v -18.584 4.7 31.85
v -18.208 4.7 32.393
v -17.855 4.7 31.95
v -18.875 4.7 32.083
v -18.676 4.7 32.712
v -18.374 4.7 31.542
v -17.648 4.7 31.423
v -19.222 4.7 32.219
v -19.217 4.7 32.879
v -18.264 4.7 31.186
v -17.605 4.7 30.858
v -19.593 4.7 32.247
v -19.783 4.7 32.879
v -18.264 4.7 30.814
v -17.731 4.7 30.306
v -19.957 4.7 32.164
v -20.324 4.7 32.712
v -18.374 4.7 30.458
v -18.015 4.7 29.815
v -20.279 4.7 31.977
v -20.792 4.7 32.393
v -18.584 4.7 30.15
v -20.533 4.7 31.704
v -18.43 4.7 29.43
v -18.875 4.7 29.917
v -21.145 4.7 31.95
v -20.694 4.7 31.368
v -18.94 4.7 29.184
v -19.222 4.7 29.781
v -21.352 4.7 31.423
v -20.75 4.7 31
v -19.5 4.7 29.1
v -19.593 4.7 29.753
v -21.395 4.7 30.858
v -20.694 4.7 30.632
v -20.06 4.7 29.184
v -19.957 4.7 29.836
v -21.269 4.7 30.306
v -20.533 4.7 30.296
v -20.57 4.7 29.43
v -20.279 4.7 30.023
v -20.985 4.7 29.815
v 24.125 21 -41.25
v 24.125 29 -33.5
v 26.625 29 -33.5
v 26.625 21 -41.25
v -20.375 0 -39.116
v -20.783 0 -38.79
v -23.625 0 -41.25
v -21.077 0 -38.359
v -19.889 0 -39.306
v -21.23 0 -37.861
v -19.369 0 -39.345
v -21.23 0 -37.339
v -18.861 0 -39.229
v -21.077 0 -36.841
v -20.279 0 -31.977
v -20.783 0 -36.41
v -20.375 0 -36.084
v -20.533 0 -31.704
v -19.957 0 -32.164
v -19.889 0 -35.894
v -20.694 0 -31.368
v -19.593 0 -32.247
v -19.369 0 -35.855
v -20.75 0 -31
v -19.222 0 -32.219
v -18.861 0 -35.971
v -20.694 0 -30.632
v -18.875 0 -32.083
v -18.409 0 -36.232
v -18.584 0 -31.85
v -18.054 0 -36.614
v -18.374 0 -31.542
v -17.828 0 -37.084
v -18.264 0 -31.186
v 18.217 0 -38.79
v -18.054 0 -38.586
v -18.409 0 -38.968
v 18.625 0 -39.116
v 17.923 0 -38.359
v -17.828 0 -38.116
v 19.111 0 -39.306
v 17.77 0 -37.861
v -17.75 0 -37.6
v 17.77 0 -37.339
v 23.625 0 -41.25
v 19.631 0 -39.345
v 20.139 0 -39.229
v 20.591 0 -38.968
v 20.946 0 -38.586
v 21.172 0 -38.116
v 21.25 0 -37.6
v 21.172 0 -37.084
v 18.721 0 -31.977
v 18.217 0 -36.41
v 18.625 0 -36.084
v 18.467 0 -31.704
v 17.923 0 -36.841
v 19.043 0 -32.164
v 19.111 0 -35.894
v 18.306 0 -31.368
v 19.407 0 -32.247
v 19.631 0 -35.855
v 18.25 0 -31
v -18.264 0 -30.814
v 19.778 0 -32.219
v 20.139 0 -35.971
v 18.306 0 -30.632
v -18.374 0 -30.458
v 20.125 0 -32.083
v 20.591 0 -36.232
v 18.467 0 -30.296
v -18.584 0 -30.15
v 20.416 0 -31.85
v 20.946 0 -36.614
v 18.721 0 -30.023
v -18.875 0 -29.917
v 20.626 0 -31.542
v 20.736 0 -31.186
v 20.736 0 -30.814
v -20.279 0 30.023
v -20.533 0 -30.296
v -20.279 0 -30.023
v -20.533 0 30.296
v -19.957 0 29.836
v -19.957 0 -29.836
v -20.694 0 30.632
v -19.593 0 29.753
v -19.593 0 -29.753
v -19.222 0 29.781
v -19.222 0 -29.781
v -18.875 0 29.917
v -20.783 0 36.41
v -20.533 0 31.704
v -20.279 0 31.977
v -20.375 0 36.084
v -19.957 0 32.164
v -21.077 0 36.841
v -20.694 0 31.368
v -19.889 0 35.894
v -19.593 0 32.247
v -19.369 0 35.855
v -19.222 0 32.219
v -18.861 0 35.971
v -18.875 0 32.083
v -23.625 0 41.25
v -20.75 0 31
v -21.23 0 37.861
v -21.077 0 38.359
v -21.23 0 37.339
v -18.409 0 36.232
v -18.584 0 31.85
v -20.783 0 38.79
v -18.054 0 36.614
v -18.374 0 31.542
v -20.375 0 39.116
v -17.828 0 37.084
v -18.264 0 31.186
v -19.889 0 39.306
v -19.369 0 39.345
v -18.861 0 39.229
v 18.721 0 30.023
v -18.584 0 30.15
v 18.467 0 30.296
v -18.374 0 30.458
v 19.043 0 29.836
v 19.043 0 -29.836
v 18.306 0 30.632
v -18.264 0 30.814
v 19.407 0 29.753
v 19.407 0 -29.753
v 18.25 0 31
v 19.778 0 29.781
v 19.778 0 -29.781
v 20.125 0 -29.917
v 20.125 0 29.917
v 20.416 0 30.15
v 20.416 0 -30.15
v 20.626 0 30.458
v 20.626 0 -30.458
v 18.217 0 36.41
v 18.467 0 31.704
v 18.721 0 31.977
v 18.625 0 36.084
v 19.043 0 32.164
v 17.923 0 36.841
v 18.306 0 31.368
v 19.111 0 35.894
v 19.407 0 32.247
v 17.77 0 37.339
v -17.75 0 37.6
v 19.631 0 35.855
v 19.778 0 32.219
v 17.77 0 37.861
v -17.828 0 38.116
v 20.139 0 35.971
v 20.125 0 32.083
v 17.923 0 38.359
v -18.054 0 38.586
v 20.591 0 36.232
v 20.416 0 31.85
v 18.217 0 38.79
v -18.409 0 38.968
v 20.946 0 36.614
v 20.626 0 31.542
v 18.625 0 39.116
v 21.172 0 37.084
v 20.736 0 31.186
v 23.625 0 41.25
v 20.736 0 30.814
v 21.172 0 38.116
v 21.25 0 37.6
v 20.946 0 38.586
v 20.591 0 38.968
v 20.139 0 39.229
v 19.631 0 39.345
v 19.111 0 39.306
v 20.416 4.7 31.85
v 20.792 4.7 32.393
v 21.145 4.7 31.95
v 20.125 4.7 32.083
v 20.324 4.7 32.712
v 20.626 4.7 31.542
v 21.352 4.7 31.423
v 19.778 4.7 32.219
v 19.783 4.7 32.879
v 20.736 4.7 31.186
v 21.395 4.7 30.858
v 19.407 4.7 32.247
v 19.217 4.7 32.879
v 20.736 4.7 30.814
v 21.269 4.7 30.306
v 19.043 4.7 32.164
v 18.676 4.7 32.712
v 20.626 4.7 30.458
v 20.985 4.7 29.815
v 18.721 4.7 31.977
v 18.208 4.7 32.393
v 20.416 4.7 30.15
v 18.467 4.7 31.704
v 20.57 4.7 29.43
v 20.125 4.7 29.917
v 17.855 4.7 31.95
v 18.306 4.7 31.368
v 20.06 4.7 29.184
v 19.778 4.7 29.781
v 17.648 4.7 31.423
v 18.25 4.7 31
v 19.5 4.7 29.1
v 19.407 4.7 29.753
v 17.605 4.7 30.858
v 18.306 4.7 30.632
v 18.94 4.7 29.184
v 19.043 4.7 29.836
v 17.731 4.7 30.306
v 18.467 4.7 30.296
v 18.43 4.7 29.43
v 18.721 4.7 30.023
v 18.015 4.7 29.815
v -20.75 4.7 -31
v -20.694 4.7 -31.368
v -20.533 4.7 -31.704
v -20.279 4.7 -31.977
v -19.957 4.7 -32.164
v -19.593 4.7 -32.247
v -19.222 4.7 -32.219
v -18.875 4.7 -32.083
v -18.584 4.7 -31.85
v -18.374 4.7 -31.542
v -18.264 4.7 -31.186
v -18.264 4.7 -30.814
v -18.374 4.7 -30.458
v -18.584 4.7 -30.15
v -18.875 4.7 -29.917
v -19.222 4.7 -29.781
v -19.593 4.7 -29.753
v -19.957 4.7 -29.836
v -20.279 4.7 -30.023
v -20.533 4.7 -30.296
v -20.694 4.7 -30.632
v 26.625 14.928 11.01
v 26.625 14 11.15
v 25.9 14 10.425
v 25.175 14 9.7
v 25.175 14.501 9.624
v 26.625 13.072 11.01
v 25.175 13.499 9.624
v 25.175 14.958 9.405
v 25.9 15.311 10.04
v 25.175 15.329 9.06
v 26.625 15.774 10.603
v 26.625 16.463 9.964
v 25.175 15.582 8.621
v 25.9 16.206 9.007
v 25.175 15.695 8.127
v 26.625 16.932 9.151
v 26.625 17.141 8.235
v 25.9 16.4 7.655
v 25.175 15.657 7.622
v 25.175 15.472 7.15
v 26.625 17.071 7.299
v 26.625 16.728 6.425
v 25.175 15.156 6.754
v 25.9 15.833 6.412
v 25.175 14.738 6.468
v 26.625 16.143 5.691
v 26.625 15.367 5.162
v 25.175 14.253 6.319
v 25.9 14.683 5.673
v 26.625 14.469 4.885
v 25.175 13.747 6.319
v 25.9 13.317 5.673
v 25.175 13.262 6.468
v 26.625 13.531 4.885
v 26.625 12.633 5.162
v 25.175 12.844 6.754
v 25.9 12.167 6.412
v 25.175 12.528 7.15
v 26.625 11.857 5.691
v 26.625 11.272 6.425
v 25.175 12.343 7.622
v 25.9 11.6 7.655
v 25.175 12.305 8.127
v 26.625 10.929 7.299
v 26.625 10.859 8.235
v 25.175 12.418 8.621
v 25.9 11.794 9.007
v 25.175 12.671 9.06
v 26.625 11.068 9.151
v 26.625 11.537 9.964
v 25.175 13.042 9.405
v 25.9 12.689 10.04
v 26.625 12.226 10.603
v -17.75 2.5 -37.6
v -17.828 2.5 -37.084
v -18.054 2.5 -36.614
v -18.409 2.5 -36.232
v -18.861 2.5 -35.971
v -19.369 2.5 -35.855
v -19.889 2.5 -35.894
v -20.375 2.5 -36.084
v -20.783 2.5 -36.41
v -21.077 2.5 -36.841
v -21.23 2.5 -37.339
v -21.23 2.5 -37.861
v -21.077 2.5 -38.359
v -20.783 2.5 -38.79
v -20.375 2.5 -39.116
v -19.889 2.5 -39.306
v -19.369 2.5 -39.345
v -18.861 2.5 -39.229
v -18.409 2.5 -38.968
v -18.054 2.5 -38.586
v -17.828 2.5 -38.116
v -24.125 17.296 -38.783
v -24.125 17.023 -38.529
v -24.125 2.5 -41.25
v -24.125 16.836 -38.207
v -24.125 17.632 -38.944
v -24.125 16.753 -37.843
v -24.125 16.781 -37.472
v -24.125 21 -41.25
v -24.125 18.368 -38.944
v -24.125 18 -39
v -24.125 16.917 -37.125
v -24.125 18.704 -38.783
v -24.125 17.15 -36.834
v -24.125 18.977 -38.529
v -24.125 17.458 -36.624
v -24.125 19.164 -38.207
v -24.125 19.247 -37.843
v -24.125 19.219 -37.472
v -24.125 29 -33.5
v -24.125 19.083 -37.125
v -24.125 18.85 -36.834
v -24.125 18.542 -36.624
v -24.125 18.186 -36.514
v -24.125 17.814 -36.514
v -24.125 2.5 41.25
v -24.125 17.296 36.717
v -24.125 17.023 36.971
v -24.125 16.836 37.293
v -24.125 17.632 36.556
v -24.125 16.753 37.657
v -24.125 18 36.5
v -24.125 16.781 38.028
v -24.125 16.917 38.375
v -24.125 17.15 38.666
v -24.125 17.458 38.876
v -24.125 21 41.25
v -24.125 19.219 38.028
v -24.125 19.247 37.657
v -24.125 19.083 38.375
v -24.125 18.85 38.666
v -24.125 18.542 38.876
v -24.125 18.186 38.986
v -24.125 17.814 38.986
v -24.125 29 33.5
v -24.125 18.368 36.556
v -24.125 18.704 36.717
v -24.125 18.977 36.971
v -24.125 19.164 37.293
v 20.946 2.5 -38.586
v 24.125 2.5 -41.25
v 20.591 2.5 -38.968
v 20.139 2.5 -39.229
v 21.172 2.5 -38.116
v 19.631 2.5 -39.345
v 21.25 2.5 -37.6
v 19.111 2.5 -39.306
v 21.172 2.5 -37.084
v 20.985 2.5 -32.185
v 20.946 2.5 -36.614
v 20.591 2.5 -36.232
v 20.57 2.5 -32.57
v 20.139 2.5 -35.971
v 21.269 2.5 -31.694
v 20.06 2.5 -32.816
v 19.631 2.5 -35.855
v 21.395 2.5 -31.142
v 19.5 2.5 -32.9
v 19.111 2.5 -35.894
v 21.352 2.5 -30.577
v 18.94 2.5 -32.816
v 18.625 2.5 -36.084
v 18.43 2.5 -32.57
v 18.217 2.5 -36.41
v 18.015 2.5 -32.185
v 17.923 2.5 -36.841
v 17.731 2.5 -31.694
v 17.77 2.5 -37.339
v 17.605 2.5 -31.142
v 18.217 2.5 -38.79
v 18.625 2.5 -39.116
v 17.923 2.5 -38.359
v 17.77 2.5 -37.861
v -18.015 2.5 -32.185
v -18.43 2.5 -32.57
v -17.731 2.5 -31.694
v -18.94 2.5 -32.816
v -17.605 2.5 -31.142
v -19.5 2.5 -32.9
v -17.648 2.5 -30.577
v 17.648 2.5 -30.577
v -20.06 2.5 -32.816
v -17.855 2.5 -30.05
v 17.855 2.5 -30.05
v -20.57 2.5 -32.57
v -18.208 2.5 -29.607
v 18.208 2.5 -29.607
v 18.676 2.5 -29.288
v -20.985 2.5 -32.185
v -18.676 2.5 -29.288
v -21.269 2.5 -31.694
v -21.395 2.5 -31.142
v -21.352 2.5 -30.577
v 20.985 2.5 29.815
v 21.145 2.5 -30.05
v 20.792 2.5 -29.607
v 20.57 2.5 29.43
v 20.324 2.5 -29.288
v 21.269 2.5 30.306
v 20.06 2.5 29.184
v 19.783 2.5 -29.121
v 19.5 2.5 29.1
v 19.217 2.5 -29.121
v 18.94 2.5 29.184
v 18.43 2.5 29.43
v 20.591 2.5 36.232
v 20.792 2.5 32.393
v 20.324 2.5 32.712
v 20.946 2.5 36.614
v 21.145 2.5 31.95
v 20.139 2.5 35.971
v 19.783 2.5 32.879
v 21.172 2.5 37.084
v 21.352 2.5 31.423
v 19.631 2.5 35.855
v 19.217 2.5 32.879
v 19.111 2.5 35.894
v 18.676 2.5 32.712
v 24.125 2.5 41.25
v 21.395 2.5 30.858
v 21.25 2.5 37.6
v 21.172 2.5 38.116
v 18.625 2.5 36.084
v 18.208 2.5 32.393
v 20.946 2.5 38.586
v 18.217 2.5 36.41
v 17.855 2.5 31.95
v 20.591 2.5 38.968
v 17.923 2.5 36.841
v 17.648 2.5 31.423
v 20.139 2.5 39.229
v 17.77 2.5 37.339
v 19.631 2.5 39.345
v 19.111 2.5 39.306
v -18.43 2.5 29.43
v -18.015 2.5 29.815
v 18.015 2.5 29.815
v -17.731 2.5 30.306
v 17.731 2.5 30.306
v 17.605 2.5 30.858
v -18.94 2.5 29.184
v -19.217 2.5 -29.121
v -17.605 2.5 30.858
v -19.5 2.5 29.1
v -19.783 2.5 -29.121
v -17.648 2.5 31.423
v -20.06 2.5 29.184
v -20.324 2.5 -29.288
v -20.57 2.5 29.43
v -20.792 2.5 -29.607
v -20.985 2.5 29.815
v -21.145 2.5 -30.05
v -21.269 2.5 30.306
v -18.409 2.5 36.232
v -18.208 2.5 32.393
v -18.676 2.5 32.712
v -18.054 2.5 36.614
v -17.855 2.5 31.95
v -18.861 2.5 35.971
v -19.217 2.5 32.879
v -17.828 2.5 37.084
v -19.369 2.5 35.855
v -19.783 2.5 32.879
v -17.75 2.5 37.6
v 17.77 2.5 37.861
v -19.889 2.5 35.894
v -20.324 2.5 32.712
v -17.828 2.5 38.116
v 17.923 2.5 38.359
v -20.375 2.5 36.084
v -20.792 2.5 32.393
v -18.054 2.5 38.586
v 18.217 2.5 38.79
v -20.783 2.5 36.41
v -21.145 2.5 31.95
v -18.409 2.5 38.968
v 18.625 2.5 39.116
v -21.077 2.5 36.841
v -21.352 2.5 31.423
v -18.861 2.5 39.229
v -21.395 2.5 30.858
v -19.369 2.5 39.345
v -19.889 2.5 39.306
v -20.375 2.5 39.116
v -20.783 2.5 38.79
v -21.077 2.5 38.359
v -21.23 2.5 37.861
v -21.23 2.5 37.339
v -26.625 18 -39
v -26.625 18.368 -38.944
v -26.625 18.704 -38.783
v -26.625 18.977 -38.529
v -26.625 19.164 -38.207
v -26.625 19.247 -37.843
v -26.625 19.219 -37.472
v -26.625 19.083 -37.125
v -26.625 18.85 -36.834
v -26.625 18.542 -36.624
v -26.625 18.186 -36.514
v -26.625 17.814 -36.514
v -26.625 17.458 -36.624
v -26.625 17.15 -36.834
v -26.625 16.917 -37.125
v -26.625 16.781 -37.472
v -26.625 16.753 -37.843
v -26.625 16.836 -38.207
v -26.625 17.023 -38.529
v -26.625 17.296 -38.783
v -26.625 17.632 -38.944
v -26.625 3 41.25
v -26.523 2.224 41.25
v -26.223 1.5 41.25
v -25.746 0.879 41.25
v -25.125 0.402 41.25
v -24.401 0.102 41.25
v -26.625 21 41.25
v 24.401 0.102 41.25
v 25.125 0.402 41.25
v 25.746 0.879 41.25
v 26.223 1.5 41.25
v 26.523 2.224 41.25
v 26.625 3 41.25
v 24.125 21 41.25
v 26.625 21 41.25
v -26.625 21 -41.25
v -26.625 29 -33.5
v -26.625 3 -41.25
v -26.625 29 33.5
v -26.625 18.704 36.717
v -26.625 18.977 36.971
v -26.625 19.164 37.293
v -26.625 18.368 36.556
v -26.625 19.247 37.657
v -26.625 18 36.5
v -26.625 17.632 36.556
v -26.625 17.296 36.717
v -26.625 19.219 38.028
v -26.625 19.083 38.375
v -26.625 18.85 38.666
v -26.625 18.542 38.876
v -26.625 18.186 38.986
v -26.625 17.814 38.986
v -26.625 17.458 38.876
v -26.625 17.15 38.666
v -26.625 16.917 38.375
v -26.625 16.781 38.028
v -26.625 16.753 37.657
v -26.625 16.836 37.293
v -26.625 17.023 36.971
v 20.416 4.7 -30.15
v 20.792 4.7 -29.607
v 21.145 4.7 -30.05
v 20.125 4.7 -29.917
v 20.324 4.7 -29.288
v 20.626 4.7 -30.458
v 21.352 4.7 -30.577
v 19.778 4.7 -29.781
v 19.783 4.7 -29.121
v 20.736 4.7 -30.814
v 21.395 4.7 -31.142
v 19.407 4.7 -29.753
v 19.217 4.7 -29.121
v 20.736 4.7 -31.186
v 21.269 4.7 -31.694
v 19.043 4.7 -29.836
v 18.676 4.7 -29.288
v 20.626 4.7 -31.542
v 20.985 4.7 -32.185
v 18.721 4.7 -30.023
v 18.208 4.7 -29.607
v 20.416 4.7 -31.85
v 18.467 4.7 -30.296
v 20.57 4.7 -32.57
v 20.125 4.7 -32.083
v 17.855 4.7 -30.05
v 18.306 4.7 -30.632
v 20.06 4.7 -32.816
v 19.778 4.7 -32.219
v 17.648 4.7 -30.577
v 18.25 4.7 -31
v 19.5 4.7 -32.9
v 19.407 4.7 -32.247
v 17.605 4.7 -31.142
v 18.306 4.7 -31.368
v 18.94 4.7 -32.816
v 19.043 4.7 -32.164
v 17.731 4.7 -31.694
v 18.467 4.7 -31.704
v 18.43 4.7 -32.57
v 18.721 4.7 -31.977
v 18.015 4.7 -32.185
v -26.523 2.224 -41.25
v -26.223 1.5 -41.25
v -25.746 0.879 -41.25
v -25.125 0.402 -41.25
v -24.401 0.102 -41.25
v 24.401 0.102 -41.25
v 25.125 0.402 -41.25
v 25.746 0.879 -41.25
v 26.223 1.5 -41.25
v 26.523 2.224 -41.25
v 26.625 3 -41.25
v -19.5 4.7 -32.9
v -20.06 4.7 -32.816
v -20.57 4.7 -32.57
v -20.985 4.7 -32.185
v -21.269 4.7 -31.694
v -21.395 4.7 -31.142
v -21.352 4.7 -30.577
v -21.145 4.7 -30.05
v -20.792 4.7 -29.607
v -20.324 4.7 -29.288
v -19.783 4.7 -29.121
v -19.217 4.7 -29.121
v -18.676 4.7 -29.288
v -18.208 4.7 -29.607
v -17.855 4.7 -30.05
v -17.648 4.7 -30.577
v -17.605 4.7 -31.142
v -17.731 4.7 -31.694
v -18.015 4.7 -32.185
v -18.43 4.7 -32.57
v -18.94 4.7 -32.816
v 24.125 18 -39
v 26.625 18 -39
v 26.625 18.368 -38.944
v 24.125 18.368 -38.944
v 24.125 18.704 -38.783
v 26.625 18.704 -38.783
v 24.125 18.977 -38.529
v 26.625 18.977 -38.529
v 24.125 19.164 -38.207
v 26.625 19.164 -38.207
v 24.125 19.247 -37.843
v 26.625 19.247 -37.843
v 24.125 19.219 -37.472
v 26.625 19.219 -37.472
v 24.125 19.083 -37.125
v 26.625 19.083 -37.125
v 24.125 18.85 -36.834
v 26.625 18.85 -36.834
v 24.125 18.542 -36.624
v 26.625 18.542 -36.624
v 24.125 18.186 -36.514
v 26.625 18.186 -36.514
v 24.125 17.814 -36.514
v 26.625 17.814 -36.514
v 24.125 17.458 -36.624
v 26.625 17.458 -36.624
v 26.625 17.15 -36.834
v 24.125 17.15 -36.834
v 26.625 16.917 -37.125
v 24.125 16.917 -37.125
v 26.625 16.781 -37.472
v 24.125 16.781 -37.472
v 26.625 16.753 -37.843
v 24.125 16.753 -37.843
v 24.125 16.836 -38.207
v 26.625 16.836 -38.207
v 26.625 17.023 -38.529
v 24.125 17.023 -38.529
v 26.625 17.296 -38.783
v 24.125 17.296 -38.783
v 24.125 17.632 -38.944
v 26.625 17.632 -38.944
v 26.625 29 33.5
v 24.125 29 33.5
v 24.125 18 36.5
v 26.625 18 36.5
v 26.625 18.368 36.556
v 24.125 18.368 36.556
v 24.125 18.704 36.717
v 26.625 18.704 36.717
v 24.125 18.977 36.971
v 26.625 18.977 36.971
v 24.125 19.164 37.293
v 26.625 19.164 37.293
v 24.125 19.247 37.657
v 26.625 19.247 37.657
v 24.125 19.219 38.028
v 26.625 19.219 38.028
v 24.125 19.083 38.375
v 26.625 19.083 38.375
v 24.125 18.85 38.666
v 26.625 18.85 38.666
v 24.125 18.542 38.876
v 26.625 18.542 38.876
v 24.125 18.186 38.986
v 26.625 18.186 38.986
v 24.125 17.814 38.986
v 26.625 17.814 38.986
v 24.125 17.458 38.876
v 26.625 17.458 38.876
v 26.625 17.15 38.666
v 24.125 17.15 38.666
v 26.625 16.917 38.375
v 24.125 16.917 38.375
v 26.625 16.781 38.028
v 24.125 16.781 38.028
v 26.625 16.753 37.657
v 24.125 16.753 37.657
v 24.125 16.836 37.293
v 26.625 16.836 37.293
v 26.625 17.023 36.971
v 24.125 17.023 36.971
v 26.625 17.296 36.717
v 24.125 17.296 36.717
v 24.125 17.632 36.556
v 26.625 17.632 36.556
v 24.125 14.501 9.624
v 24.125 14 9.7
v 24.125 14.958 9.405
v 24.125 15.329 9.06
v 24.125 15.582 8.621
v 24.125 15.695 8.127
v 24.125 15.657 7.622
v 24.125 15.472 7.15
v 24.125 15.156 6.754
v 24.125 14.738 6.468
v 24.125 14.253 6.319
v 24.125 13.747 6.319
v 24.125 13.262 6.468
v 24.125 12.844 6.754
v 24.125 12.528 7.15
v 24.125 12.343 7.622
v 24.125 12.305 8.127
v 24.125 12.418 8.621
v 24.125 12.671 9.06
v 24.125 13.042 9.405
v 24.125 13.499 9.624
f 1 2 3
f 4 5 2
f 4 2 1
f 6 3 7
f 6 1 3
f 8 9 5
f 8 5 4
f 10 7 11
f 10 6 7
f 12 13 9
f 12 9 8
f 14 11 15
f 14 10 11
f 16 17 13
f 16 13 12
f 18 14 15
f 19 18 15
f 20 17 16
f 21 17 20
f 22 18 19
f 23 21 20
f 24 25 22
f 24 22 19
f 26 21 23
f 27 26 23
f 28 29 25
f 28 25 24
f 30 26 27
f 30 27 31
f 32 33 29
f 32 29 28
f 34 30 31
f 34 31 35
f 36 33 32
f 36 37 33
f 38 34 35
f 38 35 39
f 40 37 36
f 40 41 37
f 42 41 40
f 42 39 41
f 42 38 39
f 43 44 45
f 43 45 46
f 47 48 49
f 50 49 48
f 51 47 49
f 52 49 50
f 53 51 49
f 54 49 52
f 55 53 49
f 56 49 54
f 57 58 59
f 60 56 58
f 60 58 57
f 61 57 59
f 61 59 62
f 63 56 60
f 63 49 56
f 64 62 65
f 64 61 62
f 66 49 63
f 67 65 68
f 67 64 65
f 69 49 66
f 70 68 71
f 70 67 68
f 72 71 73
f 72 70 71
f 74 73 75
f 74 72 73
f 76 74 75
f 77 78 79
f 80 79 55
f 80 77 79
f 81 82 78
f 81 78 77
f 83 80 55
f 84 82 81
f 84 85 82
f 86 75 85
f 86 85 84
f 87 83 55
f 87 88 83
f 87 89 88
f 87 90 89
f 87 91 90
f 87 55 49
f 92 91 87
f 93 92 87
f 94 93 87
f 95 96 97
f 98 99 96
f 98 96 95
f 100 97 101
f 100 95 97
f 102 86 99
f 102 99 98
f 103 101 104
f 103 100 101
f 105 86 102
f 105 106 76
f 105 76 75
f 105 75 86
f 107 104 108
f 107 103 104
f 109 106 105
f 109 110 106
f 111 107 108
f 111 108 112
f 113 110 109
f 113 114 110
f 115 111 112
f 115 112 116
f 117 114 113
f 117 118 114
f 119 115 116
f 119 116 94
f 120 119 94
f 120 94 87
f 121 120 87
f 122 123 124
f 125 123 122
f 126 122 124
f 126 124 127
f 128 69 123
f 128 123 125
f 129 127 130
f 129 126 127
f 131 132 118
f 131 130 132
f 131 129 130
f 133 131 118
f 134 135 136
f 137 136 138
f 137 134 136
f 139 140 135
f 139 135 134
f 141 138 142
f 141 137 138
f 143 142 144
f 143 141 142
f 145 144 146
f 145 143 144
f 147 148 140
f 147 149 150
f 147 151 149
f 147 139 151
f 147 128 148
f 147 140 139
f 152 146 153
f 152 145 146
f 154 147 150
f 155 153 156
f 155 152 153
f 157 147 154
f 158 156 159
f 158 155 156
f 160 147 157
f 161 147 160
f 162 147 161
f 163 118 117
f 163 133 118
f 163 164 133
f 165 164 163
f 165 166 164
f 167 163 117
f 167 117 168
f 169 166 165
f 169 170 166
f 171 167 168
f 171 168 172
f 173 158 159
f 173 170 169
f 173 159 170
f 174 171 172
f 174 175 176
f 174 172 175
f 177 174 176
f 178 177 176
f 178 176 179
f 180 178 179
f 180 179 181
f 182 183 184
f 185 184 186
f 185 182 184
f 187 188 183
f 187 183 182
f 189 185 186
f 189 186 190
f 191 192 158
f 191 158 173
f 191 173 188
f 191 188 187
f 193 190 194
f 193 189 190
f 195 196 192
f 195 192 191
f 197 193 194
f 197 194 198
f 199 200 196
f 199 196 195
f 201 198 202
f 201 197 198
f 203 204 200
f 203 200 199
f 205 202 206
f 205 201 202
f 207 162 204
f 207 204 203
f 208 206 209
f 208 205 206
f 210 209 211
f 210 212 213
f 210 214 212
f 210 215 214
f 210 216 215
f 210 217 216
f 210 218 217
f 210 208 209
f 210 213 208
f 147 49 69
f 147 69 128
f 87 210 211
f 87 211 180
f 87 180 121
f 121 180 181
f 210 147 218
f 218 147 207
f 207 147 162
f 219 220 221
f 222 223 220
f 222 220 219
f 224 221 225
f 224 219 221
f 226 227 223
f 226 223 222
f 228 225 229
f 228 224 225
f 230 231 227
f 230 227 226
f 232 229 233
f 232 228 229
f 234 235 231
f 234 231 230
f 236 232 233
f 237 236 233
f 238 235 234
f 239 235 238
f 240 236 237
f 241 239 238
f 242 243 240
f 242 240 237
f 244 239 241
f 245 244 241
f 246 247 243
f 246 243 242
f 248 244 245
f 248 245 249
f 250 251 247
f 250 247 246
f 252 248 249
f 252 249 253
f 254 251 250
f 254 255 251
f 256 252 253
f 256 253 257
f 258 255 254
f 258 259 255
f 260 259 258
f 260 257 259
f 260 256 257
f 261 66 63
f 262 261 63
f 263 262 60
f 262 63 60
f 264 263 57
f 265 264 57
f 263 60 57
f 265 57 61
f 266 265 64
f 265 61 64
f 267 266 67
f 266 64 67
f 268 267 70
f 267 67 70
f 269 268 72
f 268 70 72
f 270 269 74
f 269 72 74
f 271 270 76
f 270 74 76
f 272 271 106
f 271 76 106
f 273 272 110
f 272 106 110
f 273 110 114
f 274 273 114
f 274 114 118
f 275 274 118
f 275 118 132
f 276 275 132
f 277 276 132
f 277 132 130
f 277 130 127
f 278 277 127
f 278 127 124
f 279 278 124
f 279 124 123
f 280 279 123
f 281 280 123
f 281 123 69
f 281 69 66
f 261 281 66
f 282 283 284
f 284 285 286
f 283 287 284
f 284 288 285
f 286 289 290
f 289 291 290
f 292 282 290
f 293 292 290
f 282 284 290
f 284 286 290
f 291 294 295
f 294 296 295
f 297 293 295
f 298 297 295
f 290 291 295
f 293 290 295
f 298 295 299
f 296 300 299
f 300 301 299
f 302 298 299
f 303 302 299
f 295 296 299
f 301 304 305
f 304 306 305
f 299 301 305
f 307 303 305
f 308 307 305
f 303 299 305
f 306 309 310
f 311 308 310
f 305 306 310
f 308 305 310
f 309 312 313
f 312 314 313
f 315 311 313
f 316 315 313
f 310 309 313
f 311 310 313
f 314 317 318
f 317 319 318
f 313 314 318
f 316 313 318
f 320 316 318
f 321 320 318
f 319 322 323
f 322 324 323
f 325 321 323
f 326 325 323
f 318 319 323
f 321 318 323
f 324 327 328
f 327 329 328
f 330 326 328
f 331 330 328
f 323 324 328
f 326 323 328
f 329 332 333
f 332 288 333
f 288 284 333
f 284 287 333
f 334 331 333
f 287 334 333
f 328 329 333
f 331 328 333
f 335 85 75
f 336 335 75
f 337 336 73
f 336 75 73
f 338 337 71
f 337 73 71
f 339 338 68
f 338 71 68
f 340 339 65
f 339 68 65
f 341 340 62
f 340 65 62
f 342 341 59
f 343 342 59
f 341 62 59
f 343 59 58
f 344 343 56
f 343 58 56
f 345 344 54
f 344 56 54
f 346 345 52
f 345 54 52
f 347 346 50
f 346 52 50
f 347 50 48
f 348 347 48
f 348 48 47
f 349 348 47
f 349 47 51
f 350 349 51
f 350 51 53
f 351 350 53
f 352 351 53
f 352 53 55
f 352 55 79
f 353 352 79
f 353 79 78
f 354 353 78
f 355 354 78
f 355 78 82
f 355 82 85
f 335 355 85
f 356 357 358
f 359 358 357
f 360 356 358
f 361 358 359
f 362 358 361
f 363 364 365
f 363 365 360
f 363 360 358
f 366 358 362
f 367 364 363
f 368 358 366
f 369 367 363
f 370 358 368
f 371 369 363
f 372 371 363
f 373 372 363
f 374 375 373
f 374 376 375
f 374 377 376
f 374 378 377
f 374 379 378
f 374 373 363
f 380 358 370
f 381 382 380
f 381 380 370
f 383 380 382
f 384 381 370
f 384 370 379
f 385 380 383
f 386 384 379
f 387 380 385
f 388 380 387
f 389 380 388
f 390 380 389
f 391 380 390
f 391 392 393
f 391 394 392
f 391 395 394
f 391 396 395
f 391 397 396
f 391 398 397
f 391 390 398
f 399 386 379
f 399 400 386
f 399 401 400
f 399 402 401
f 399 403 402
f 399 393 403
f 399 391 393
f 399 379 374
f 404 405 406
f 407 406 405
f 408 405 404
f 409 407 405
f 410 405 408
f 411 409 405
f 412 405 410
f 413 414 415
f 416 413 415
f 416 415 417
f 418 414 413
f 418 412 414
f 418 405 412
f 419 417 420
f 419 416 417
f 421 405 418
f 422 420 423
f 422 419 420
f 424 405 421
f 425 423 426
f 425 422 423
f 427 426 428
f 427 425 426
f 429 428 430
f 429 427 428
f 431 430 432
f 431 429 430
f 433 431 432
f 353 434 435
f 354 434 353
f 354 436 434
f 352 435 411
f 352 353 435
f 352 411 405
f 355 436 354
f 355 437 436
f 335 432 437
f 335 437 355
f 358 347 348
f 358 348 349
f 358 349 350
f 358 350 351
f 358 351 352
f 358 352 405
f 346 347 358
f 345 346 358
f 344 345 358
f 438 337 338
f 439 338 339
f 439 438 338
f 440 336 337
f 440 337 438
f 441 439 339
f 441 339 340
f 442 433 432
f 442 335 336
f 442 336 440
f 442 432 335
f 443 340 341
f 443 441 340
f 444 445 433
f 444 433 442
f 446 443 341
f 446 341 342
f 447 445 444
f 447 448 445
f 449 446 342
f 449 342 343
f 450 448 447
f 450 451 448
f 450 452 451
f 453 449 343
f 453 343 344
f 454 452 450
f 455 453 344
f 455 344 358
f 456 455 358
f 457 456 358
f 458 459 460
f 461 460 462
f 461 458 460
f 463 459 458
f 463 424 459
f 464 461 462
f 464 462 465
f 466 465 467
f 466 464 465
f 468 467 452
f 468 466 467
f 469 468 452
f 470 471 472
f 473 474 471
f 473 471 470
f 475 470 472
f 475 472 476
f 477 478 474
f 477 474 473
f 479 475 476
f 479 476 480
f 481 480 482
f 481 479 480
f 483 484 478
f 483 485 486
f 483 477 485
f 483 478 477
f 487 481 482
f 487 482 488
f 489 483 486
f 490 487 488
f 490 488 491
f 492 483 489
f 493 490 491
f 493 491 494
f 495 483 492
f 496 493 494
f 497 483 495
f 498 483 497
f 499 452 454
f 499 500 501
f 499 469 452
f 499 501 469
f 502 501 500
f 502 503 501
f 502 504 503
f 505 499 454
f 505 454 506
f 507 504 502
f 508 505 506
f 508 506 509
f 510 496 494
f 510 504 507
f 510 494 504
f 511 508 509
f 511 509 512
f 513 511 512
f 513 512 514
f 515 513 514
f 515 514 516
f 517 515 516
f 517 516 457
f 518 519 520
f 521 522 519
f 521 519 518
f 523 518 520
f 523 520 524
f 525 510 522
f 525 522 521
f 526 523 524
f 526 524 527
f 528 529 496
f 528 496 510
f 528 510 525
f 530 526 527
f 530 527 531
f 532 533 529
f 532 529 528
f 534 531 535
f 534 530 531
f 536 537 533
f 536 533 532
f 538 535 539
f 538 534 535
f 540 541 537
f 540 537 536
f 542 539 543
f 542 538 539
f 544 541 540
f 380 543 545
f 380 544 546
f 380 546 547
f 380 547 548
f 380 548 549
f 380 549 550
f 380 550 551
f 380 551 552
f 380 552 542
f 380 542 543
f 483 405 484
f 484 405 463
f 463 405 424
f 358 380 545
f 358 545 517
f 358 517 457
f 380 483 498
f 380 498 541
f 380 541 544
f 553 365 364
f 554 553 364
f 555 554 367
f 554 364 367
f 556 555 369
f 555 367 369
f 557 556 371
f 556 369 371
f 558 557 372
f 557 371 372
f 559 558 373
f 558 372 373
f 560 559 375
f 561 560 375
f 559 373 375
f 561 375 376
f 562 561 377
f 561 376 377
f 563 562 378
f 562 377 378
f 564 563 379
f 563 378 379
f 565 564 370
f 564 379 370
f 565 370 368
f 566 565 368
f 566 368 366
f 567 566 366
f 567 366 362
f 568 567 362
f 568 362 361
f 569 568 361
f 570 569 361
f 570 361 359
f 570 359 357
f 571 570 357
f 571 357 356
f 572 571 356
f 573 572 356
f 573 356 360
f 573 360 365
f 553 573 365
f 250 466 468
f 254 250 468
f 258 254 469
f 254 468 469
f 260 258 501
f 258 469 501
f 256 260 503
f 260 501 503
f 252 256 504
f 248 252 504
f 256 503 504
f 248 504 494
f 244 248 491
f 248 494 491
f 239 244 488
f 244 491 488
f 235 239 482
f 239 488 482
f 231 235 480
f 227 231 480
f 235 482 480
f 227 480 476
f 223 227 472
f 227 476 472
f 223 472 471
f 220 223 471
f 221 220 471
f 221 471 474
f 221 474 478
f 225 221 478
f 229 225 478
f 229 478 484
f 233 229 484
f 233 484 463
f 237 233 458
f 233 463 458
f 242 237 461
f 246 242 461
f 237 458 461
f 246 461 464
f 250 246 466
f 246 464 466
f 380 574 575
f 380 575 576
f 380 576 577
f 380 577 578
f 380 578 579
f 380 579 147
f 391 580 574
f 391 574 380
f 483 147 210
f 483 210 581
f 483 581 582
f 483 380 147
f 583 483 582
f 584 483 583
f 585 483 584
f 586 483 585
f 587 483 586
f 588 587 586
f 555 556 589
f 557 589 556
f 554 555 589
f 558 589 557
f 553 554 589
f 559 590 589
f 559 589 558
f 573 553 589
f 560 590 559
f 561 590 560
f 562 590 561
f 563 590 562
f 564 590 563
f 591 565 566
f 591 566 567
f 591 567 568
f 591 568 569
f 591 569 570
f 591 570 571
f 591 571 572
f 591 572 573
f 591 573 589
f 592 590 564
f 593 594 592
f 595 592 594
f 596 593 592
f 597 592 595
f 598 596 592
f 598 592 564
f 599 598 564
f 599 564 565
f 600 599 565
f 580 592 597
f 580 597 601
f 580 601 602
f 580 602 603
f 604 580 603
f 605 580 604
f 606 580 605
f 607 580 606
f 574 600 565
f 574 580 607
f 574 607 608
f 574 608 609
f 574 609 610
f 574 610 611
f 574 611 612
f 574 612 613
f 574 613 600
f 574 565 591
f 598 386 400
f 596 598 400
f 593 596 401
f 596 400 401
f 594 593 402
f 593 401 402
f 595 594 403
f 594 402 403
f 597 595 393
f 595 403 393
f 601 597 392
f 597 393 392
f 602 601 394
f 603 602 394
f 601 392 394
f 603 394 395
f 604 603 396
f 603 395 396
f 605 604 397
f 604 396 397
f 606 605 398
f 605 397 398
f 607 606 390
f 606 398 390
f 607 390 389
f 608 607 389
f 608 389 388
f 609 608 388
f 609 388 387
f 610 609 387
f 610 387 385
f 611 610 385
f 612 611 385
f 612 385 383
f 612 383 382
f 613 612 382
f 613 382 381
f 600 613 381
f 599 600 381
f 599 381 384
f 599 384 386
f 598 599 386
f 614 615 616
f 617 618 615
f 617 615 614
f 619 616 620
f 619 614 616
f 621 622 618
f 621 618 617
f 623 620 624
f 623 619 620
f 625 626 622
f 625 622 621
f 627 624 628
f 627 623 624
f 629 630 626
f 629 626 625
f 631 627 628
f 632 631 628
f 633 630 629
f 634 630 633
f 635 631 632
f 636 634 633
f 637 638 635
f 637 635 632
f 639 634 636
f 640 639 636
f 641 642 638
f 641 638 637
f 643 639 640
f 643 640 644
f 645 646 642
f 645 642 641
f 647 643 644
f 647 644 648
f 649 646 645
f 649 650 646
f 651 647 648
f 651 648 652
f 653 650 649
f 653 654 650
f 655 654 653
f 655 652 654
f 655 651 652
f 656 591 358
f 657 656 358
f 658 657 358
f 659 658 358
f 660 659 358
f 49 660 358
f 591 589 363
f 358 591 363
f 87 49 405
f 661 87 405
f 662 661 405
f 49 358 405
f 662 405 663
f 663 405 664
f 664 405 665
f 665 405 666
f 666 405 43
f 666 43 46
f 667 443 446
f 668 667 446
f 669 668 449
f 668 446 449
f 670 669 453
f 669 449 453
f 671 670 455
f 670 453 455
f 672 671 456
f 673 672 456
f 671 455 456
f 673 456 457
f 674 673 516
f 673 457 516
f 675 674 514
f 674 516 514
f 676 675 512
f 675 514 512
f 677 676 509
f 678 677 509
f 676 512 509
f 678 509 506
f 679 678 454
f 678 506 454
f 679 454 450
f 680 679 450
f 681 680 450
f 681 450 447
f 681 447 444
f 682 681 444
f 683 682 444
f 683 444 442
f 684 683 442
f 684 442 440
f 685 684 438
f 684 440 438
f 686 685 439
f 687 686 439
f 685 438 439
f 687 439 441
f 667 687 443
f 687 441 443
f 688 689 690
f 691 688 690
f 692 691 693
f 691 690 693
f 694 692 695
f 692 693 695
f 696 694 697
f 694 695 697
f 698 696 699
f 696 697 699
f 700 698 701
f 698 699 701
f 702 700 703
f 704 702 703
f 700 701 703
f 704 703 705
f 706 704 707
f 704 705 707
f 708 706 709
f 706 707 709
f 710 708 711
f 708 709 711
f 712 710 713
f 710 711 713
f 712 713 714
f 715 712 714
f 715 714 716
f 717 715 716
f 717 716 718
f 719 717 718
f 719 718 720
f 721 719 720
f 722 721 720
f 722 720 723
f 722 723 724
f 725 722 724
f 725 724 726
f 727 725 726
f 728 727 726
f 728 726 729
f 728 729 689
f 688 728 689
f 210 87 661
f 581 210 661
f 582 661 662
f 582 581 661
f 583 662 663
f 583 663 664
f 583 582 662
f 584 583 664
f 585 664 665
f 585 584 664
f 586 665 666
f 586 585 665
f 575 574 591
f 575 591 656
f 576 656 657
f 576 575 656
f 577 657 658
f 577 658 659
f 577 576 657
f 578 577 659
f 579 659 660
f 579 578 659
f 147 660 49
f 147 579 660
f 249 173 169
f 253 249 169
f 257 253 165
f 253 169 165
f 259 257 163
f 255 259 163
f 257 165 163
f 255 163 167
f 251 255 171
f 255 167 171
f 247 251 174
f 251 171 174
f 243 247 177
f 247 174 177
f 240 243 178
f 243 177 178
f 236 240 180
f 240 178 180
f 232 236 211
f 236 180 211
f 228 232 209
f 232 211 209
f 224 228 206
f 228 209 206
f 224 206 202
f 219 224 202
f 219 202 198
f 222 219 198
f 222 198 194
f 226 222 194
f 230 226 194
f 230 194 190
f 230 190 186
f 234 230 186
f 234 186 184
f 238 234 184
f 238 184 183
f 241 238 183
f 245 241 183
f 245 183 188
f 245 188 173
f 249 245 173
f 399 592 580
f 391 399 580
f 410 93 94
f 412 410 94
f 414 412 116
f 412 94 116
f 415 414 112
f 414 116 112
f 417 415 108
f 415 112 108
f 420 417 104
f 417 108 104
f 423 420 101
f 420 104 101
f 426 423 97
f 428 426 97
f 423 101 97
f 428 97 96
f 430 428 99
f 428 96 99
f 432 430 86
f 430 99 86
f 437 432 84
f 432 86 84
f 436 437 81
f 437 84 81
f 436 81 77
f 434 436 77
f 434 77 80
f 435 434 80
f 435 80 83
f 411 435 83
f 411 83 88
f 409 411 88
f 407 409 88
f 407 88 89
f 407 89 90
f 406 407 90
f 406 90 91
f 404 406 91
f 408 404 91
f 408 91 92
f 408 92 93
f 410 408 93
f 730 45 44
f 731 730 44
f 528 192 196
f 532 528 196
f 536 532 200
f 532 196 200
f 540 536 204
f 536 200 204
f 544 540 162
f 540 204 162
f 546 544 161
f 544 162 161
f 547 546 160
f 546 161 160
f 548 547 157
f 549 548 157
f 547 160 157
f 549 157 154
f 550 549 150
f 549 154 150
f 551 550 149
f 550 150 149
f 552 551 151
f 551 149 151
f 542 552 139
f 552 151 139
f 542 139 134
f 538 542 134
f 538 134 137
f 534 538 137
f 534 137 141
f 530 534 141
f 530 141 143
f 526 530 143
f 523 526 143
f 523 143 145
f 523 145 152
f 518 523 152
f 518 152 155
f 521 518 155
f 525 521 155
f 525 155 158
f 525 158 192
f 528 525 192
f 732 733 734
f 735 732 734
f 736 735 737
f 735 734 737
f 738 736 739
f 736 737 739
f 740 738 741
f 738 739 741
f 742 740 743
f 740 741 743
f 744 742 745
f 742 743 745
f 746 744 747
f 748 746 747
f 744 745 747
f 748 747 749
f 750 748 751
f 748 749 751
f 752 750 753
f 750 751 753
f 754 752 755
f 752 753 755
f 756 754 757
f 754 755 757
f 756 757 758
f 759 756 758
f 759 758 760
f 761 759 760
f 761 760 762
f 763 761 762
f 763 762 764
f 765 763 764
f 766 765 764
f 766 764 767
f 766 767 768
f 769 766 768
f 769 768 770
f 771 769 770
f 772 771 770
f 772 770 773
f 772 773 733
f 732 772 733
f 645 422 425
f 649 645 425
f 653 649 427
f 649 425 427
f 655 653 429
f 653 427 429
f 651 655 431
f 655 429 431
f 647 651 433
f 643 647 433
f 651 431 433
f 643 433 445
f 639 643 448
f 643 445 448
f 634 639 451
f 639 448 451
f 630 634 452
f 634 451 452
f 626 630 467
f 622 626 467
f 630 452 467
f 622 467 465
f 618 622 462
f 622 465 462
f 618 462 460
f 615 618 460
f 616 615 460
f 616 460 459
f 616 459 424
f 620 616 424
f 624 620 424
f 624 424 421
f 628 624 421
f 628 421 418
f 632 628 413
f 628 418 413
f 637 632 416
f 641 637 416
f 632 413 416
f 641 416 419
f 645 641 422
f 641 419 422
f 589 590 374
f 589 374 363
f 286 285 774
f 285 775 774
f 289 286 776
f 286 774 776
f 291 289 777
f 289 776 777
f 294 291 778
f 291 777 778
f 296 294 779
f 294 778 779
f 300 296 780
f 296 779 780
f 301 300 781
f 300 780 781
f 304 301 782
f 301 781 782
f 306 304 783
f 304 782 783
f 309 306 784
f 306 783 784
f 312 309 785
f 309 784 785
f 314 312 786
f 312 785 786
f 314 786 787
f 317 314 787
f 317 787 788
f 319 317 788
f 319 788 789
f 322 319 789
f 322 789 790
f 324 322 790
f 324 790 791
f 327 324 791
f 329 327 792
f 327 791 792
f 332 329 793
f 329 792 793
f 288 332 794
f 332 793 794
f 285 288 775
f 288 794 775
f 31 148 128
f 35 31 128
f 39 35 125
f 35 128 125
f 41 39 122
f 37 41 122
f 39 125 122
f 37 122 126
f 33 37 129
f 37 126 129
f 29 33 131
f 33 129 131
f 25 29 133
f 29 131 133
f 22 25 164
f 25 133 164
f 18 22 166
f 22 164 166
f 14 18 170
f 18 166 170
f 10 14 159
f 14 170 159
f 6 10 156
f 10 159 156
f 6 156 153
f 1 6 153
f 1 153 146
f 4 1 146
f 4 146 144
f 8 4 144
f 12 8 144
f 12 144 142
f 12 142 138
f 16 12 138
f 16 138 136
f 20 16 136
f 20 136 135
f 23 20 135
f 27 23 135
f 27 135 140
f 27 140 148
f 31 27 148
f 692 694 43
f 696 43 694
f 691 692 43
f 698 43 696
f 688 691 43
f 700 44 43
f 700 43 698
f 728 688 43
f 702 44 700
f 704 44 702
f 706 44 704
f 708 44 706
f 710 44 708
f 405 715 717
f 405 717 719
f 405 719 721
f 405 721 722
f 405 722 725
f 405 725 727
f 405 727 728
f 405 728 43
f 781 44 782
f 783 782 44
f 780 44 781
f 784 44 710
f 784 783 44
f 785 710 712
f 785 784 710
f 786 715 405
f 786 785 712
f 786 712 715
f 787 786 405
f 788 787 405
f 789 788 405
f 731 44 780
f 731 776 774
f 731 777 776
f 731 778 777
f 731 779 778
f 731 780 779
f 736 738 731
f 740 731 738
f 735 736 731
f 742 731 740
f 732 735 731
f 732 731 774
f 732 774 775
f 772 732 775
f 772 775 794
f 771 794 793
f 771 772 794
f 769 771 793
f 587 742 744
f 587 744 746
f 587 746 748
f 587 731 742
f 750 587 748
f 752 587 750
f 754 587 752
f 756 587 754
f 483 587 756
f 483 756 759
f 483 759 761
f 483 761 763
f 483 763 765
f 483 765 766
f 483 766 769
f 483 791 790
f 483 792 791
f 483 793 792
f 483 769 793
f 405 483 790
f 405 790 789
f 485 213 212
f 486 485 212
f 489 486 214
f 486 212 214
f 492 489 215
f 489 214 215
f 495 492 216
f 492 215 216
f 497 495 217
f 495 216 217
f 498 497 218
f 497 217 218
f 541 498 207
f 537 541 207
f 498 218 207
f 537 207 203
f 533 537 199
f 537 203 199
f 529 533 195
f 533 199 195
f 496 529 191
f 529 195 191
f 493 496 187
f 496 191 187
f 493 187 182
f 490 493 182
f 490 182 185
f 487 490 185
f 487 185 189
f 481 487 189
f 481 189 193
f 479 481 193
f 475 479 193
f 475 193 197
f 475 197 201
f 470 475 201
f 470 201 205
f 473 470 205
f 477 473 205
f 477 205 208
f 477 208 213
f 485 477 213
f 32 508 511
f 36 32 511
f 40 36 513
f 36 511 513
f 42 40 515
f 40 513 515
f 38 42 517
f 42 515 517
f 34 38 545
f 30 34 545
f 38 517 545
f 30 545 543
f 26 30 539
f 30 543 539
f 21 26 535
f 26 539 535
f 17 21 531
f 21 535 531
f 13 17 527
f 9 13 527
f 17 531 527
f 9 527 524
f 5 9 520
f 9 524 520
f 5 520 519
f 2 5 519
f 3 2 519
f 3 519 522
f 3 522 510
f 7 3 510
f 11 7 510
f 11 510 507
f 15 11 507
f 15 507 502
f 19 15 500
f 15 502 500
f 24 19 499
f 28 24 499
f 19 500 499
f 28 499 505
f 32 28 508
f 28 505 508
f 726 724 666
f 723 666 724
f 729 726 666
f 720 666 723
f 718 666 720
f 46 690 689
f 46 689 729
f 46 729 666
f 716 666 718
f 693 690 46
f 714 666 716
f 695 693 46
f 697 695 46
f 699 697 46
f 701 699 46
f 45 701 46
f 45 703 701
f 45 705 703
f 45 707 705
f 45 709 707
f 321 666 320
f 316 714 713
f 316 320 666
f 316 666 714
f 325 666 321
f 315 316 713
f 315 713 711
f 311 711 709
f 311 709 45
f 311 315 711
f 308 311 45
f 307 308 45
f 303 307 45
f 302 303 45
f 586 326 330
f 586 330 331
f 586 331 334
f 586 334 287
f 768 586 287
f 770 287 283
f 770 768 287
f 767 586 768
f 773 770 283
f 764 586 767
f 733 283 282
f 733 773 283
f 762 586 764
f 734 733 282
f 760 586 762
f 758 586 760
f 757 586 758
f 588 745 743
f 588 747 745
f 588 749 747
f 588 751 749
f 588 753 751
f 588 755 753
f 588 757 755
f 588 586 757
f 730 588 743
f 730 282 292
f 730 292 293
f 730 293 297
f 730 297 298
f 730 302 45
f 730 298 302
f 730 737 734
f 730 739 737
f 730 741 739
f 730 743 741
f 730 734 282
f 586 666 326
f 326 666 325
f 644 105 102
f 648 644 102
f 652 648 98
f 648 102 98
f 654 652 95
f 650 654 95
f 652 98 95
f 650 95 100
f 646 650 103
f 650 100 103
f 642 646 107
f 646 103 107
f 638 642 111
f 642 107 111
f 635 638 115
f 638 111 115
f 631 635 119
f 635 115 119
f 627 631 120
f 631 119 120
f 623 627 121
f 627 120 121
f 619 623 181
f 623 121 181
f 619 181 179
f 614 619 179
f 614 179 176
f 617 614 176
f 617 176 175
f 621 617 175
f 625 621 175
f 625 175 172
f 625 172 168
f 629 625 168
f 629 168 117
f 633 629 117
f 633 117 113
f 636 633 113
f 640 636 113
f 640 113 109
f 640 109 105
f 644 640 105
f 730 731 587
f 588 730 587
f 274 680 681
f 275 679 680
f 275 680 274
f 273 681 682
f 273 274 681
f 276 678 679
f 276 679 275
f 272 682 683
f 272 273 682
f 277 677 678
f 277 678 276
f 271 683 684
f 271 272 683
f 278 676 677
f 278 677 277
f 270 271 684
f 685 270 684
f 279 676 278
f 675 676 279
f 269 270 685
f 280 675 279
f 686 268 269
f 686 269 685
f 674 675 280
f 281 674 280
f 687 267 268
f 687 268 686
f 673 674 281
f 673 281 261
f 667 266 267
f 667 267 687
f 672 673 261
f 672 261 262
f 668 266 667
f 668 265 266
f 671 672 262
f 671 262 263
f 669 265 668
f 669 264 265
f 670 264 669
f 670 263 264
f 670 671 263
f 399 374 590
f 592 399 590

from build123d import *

# Parameters (mm, degrees)
EXTRUDE_1_DEPTH               = 41.25
CUT_EXTRUDE_1_DEPTH           = 58.02151458
CUT_EXTRUDE_1_DEPTH_BACK      = 58.02151458
SKETCH_4_R                    = 1.75
CUT_EXTRUDE_2_DEPTH           = 10
HOLE_WIZARD_M31_REACH         = 75.336
HOLE_WIZARD_M31_BORE_R        = 1.25
HOLE_WIZARD_M32_D             = 2.5
SKETCH_10_R                   = 1.9
EXTRUDE_2_DEPTH               = 2.2
HOLE_WIZARD_M33_D             = 2.5
HOLE_WIZARD_M31_2_D           = 3.4
HOLE_WIZARD_M31_2_DEPTH       = 8.5
HOLE_WIZARD_M31_2_CSINK_D     = 6.3
HOLE_WIZARD_M31_2_CSINK_ANGLE = 90
HOLE_WIZARD_M31_2_TIP         = 1.021463052


with BuildPart() as part:
    # Эскиз1 → Бобышка-Вытянуть1 (new, symmetric)
    with BuildSketch(Plane.XY):
        with BuildLine():
            Line((-26.625, 29), (-26.625, 3))
            ThreePointArc((-26.625, 3), (-25.746320344, 0.878679656), (-23.625, 0))
            Line((-23.625, 0), (23.625, 0))
            ThreePointArc((23.625, 0), (25.746320344, 0.878679656), (26.625, 3))
            Line((26.625, 3), (26.625, 29))
            Line((26.625, 29), (24.125, 29))
            Line((24.125, 29), (24.125, 2.5))
            Line((24.125, 2.5), (-24.125, 2.5))
            Line((-24.125, 2.5), (-24.125, 29))
            Line((-24.125, 29), (-26.625, 29))
        make_face()
    extrude(amount=EXTRUDE_1_DEPTH, both=True)

    # Эскиз3 → Вырез-Вытянуть1 (cut, two sides: drawn at the far end of the back side and taken through both)
    with BuildSketch(Plane(origin=(0, 0, 0), x_dir=(0, 0, -1), z_dir=(1, 0, 0)).offset(-CUT_EXTRUDE_1_DEPTH_BACK)):
        Polygon((41.25, 21), (41.25, 29), (33.5, 29), align=None)
        Polygon((-41.25, 21), (-41.25, 29), (-33.5, 29), align=None)
    extrude(amount=CUT_EXTRUDE_1_DEPTH + CUT_EXTRUDE_1_DEPTH_BACK, mode=Mode.SUBTRACT)

    # Эскиз4 → Вырез-Вытянуть2 (cut)
    with BuildSketch(Plane.XZ):
        with Locations((-19.5, -37.6)):
            Circle(SKETCH_4_R)
        with Locations((-19.5, 37.6)):
            Circle(SKETCH_4_R)
        with Locations((19.5, 37.6)):
            Circle(SKETCH_4_R)
        with Locations((19.5, -37.6)):
            Circle(SKETCH_4_R)
    extrude(amount=-CUT_EXTRUDE_2_DEPTH, mode=Mode.SUBTRACT)

    # Hole Wizard M31 bore → Hole Wizard M31 (cut, up to next)
    with BuildSketch(Plane(origin=(26.625, 0, 0), x_dir=(0, 0, -1), z_dir=(1, 0, 0)), mode=Mode.PRIVATE) as hole_wizard_m31_sk1:
        with Locations((37.75, 18)):
            Circle(HOLE_WIZARD_M31_BORE_R)
    hole_wizard_m31_tool1 = extrude(hole_wizard_m31_sk1.sketch, amount=-HOLE_WIZARD_M31_REACH, mode=Mode.PRIVATE) & part.part
    # Hole Wizard M31 bore → Hole Wizard M31 (cut, up to next)
    with BuildSketch(Plane(origin=(26.625, 0, 0), x_dir=(0, 0, -1), z_dir=(1, 0, 0)), mode=Mode.PRIVATE) as hole_wizard_m31_sk2:
        with Locations((-37.75, 18)):
            Circle(HOLE_WIZARD_M31_BORE_R)
    hole_wizard_m31_tool2 = extrude(hole_wizard_m31_sk2.sketch, amount=-HOLE_WIZARD_M31_REACH, mode=Mode.PRIVATE) & part.part
    add(hole_wizard_m31_tool1.solids().sort_by_distance((26.625, 18, -37.75))[0], mode=Mode.SUBTRACT)
    add(hole_wizard_m31_tool2.solids().sort_by_distance((26.625, 18, 37.75))[0], mode=Mode.SUBTRACT)

    # Отверстие обработанное метчиком M32 (through all)
    with Locations(Plane.ZY.offset(26.625)):
        with Locations((-37.75, 18), (37.75, 18)):
            Hole(HOLE_WIZARD_M32_D / 2)

    # Эскиз10 → Бобышка-Вытянуть2 (add)
    with BuildSketch(Plane(origin=(0, 2.5, 0), x_dir=(1, 0, 0), z_dir=(0, 1, 0))):
        with Locations(Location((19.5, 31, 0), (0, 0, 90))):
            Circle(SKETCH_10_R)
        with Locations(Location((19.5, -31, 0), (0, 0, 90))):
            Circle(SKETCH_10_R)
        with Locations(Location((-19.5, -31, 0), (0, 0, 90))):
            Circle(SKETCH_10_R)
        with Locations(Location((-19.5, 31, 0), (0, 0, 90))):
            Circle(SKETCH_10_R)
    extrude(amount=EXTRUDE_2_DEPTH)

    # Отверстие обработанное метчиком M33 (through all)
    with Locations(Plane(origin=(0, 4.7, 0), x_dir=(1, 0, 0), z_dir=(0, 1, 0))):
        with Locations((19.5, 31), (-19.5, 31), (19.5, -31), (-19.5, -31)):
            Hole(HOLE_WIZARD_M33_D / 2)

    # Hole Wizard M31 2
    with Locations(Plane(origin=(26.625, 0, 0), x_dir=(0, 0, -1), z_dir=(1, 0, 0))):
        with Locations((-8, 14)):
            CounterSinkHole(HOLE_WIZARD_M31_2_D / 2, HOLE_WIZARD_M31_2_CSINK_D / 2, depth=HOLE_WIZARD_M31_2_DEPTH, counter_sink_angle=HOLE_WIZARD_M31_2_CSINK_ANGLE)
            with Locations((0, 0, -(HOLE_WIZARD_M31_2_DEPTH + HOLE_WIZARD_M31_2_TIP / 2))):  # 118° drill point
                Cone(0, HOLE_WIZARD_M31_2_D / 2, HOLE_WIZARD_M31_2_TIP, mode=Mode.SUBTRACT)


solid = part.part
